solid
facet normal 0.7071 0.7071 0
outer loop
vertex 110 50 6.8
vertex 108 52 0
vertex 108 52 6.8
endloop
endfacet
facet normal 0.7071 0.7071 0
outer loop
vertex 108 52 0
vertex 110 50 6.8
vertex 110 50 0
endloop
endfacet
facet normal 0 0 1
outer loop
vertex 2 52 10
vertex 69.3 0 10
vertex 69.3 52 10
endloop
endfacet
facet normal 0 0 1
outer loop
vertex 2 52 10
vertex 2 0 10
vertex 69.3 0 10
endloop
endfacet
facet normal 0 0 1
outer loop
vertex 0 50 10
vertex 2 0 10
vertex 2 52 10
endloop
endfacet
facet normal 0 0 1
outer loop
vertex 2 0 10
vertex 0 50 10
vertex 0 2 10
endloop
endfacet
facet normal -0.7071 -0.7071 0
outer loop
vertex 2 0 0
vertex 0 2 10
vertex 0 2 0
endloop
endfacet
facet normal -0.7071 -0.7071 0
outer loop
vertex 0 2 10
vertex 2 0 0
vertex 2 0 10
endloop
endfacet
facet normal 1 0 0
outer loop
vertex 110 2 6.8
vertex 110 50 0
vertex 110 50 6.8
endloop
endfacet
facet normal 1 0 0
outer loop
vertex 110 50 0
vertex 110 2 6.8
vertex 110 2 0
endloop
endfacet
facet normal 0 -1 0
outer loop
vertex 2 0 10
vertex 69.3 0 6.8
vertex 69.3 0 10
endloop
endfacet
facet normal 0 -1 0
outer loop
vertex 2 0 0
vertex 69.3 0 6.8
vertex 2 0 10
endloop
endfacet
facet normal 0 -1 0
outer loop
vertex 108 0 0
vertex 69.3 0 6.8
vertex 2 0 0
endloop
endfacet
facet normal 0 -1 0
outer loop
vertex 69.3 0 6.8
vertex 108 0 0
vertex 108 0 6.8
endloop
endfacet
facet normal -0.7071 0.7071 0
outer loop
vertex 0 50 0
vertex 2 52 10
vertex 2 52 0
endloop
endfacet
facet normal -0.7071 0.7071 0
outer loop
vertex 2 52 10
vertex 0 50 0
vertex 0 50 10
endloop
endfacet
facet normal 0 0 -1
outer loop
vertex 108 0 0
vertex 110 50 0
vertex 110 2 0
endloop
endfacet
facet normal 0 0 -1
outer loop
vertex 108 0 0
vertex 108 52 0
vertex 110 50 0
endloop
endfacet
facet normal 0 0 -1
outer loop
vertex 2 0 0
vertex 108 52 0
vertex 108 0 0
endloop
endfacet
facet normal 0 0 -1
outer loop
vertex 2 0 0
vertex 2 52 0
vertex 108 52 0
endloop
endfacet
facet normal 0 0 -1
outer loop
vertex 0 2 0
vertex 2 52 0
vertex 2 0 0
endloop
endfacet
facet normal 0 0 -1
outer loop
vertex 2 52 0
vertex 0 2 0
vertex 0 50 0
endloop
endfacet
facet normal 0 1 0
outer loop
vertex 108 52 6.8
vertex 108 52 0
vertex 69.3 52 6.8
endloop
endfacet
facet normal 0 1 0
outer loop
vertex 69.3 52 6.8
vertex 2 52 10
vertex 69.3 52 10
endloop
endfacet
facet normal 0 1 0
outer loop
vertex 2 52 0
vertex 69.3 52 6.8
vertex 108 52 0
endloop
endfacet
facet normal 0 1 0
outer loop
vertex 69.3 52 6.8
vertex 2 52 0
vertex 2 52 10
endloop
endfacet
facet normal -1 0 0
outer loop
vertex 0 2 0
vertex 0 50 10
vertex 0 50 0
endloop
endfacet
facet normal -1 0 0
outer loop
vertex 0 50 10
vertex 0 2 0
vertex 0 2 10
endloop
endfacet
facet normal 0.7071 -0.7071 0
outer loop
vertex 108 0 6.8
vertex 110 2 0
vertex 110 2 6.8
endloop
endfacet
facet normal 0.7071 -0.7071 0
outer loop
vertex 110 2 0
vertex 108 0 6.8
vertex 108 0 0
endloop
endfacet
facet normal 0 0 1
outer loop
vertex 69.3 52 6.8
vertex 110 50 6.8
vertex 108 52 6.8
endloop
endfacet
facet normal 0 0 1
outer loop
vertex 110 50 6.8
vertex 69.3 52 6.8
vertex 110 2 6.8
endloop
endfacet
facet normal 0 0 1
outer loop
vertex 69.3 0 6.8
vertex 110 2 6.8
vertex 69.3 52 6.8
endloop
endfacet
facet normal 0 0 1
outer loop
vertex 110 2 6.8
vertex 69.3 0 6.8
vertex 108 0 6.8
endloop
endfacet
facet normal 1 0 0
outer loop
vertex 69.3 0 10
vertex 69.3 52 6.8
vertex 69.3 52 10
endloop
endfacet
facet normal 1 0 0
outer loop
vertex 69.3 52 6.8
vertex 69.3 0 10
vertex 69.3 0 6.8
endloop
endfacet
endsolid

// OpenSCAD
$fn = 32;

// ----------------------------------------------------------------------
// Stepped bar: endstep, 110 x 52 x 10/6.8 mm
// ----------------------------------------------------------------------

// --- parameters (mm) ---
bar_l = 110;              // bar length, X
bar_w = 52;               // bar width, Y
plate_t = 10;             // thickness of the thick zone, Z
thin_t = 6.8;             // thickness of the thin zone
corner_c = 2;             // corner chamfer of the bar
step_cut = 3.2;           // material removed from the thin zone
step_x = 69.3;            // step position from the left end
depth_1 = 3.2;            // depth of cut 1 from the top face
fit_tol = 0.05;           // declared fit tolerance (prompt contract)
free_tol = 0.3;           // declared free tolerance (prompt contract)

profile = [[2, 0], [108, 0], [110, 2], [110, 50], [108, 52], [2, 52], [0, 50], [0, 2]];  // primary outline, 8 points, counter clockwise
void_1 = [[69.3, -1], [111, -1], [111, 53], [69.3, 53]];  // thin zone beyond the step, 4 points

// --- the one profile operation ---
difference() {
  linear_extrude(height = plate_t) polygon(points = profile);
  translate([0, 0, plate_t - depth_1])
    linear_extrude(height = depth_1 + 1) polygon(points = void_1);
}
